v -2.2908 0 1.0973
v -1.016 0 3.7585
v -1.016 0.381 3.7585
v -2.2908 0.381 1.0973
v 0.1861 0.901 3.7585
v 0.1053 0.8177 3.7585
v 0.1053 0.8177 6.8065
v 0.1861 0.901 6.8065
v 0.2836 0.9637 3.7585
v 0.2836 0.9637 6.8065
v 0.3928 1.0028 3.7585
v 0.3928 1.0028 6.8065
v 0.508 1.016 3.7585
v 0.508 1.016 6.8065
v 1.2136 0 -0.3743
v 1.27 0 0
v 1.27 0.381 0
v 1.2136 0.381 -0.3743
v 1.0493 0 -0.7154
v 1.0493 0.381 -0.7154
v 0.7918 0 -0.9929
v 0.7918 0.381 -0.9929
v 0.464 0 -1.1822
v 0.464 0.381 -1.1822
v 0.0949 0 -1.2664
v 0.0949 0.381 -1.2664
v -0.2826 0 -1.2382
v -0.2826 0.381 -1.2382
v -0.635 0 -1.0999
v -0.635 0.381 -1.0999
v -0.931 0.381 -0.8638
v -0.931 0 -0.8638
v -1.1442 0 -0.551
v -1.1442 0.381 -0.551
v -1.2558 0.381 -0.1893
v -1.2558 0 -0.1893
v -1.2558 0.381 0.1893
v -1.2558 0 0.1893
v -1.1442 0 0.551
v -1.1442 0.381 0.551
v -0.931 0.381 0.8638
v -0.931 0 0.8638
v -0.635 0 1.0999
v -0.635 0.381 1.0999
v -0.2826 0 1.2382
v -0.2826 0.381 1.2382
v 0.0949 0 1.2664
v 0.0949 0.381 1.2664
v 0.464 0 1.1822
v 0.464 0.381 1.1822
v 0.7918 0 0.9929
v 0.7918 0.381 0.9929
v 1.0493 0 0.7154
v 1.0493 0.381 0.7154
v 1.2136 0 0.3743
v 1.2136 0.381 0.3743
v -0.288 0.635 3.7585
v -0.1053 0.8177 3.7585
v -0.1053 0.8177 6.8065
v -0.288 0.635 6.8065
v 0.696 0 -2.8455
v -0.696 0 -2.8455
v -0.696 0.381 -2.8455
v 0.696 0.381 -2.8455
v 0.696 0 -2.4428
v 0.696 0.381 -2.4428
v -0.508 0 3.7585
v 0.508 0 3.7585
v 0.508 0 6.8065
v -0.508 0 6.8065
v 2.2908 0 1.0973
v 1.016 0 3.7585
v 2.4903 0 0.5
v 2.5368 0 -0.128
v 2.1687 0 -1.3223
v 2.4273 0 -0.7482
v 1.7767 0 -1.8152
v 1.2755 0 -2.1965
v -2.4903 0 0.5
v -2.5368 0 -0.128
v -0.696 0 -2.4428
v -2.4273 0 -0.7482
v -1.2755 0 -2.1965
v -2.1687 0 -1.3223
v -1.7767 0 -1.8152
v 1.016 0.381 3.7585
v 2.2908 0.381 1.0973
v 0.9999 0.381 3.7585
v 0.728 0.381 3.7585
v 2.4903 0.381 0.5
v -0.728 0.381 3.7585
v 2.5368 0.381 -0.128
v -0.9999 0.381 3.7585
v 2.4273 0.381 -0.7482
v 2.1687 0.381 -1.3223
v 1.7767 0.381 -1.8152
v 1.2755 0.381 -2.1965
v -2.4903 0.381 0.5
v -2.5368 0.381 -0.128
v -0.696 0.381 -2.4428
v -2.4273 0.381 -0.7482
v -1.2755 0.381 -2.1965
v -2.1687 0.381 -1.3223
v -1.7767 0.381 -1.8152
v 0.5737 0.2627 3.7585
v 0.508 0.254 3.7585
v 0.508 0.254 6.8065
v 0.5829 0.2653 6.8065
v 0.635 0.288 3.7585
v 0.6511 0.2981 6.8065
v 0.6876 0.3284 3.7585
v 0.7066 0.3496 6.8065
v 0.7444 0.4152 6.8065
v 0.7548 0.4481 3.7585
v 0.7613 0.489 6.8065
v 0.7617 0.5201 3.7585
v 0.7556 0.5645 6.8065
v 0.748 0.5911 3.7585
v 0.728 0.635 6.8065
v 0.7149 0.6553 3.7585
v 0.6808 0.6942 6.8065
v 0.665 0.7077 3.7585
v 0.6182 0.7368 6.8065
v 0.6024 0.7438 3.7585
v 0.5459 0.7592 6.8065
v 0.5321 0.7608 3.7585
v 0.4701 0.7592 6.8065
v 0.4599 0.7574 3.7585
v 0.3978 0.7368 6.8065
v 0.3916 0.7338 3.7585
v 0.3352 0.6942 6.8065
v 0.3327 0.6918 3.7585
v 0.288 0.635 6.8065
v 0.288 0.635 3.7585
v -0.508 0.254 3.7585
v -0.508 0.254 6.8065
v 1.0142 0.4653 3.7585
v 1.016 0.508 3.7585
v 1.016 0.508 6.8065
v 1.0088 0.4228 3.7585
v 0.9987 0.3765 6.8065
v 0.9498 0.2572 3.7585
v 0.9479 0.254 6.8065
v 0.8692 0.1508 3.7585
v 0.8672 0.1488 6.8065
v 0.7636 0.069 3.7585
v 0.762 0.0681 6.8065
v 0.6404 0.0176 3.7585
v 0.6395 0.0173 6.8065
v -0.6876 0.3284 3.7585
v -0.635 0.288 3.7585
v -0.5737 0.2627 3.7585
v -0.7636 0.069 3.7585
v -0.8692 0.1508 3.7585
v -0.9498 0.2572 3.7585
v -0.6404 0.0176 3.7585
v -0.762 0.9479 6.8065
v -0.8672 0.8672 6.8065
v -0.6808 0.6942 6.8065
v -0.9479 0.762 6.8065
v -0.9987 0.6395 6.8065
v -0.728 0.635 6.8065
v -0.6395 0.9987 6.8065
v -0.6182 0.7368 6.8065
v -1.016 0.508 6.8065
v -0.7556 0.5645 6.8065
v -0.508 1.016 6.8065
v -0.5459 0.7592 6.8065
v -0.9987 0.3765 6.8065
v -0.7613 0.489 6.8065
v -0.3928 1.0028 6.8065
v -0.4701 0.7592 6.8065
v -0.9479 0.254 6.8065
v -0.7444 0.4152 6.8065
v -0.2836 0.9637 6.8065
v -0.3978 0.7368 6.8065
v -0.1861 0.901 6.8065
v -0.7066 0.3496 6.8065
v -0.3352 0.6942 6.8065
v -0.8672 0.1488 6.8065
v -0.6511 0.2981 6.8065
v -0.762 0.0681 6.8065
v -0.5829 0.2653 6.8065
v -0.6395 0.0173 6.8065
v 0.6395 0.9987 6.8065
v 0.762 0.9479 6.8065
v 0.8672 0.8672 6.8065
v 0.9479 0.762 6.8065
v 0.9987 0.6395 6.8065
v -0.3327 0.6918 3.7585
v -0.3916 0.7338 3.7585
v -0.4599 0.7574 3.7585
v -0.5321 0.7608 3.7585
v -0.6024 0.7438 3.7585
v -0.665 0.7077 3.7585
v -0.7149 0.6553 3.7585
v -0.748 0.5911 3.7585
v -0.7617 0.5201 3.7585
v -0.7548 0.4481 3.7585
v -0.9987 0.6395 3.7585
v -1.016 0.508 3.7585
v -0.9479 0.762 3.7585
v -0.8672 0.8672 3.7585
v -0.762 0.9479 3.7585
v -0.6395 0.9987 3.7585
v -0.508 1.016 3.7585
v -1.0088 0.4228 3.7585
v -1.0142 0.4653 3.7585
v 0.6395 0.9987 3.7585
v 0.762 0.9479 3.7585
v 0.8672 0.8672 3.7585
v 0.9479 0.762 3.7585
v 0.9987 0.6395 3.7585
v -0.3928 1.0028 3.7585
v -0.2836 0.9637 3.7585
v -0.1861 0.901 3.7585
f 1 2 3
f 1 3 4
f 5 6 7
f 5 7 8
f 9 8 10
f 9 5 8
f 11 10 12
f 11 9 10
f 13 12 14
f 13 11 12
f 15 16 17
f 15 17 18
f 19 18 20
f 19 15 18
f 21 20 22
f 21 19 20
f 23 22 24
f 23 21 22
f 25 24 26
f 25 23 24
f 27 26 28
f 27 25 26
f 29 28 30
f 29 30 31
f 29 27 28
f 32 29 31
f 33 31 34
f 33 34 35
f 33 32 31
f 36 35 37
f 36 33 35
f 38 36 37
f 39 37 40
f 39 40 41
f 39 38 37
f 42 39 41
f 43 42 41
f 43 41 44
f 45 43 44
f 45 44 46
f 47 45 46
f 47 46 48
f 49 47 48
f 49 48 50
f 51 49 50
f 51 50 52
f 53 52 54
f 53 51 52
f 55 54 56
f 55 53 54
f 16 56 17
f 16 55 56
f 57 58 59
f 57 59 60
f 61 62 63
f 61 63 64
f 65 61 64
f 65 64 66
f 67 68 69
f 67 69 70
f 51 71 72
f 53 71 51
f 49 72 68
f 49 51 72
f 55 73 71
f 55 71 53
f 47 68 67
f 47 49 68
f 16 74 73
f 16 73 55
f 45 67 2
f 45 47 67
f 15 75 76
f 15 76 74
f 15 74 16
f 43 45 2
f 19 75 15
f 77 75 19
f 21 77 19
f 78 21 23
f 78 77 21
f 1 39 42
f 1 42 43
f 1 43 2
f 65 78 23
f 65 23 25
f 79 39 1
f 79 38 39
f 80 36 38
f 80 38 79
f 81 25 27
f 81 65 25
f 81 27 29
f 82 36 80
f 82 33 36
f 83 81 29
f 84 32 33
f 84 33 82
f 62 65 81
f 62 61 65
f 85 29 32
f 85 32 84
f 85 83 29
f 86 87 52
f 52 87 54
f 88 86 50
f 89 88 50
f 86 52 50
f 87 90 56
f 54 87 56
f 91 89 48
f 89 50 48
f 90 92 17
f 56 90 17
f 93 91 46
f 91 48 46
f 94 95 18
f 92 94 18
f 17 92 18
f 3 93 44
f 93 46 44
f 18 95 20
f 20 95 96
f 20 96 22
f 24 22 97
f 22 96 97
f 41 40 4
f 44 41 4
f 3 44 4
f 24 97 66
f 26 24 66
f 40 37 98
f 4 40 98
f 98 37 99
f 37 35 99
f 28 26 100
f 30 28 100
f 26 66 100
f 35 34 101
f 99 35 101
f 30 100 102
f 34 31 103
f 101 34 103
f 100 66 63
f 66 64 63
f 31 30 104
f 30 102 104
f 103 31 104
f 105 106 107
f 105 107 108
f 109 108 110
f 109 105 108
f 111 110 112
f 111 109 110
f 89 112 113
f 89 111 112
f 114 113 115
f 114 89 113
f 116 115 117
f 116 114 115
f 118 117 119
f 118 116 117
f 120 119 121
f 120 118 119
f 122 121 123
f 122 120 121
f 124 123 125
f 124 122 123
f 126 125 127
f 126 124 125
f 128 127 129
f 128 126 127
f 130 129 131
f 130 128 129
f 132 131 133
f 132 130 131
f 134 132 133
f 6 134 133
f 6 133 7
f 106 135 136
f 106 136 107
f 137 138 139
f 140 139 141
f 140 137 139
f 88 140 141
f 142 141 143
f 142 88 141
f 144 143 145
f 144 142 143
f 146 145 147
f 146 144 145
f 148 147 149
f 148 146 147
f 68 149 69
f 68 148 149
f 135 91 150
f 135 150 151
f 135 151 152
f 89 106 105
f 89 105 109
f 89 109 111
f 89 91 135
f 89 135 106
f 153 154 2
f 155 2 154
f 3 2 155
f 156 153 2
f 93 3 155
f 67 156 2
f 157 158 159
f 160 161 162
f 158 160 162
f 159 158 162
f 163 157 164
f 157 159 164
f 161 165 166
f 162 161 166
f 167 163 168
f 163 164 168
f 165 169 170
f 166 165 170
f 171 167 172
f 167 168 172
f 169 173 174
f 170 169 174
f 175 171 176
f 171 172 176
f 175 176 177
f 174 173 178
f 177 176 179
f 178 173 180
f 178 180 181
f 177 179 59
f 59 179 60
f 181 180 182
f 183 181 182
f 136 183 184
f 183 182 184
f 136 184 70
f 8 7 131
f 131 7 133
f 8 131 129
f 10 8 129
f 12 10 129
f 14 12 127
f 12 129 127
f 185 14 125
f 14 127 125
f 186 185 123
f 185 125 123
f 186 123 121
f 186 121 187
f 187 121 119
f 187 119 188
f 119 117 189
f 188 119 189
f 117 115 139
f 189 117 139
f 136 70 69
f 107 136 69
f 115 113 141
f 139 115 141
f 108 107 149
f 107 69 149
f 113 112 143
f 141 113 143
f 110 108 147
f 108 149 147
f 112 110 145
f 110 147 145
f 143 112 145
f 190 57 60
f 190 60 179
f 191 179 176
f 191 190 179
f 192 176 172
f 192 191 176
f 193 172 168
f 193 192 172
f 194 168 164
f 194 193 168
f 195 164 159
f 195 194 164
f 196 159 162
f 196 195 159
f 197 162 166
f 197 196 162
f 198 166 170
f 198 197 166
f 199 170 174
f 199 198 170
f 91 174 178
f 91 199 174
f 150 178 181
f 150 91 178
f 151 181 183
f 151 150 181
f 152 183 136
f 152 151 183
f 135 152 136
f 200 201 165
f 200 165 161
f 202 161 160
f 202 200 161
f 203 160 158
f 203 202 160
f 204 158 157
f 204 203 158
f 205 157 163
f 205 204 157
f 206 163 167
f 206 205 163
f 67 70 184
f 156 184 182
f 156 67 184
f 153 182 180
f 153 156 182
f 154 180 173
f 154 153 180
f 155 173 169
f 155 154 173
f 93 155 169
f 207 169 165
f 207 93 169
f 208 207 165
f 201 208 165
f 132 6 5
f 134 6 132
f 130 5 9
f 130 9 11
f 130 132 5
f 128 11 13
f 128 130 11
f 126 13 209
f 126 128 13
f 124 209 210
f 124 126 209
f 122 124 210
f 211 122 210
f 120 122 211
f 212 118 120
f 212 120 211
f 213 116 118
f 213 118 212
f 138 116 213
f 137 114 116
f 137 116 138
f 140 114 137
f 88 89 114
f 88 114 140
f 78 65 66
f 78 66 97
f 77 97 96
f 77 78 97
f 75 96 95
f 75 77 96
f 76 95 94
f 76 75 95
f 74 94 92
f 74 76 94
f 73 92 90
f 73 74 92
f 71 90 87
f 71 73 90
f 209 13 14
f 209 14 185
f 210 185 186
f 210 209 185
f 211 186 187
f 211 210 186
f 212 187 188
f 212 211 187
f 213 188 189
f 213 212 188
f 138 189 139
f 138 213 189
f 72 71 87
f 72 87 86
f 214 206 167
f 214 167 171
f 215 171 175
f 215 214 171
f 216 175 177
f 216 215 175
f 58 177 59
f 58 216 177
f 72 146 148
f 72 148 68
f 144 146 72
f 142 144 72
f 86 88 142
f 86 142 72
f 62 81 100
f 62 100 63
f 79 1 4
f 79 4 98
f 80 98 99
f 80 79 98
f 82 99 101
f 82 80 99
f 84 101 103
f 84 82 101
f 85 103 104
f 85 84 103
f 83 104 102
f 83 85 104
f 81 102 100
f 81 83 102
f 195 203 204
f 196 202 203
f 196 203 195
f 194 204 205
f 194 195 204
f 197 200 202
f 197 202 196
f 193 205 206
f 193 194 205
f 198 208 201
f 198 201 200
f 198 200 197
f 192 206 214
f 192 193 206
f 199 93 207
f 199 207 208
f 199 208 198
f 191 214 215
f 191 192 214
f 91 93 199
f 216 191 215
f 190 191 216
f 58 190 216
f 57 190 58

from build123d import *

# Parameters (mm, degrees)
SKETCH1_R           = 1.27
BOSS_EXTRUDE1_DEPTH = 0.381
SKETCH2_W           = 2.032
SKETCH2_H           = 3.048
BOSS_EXTRUDE2_DEPTH = 0.635
CUT_EXTRUDE1_START  = -3.048
CUT_EXTRUDE1_DEPTH  = 3.048


with BuildPart() as part:
    # Sketch1 → Boss-Extrude1 (new body)
    with BuildSketch(Plane(origin=(0, 0, 0), x_dir=(1, 0, 0), z_dir=(0, 1, 0))):
        with BuildLine():
            Line((-0.695956456, 2.442794427), (-0.695956456, 2.845479033))
            Line((-0.695956456, 2.845479033), (0.695956456, 2.845479033))
            Line((0.695956456, 2.845479033), (0.695956456, 2.442794427))
            ThreePointArc((0.695956456, 2.442794427), (2.315850071, 1.043282535), (2.290753246, -1.097291924))
            Line((2.290753246, -1.097291924), (1.016, -3.758520967))
            Line((1.016, -3.758520967), (1.016, -6.806520967))
            Line((1.016, -6.806520967), (-1.016, -6.806520967))
            Line((-1.016, -6.806520967), (-1.016, -3.758520967))
            Line((-1.016, -3.758520967), (-2.290753246, -1.097291924))
            ThreePointArc((-2.290753246, -1.097291924), (-2.315850071, 1.043282535), (-0.695956456, 2.442794427))
        make_face()
        Circle(SKETCH1_R, mode=Mode.SUBTRACT)
    extrude(amount=BOSS_EXTRUDE1_DEPTH)

    # Sketch2 → Boss-Extrude2 (add)
    with BuildSketch(Plane(origin=(0, 0.381, 0), x_dir=(1, 0, 0), z_dir=(0, 1, 0))):
        with Locations((0, -5.282520967)):
            Rectangle(SKETCH2_W, SKETCH2_H)
    extrude(amount=BOSS_EXTRUDE2_DEPTH)

    # Sketch3 → Cut-Extrude1 (cut)
    with BuildSketch(Plane.XY.offset(6.806520967).offset(CUT_EXTRUDE1_START)):
        with BuildLine():
            ThreePointArc((1.016, 0.508), (0.867210245, 0.148789755), (0.508, 0))
            Line((0.508, 0), (1.016, 0))
            Line((1.016, 0), (1.016, 0.508))
        make_face()
        with BuildLine():
            ThreePointArc((-0.508, 0), (-0.867210245, 0.148789755), (-1.016, 0.508))
            Line((-1.016, 0.508), (-1.016, 0))
            Line((-1.016, 0), (-0.508, 0))
        make_face()
        with BuildLine():
            ThreePointArc((-1.016, 0.508), (-0.867210245, 0.867210245), (-0.508, 1.016))
            Line((-0.508, 1.016), (-1.016, 1.016))
            Line((-1.016, 1.016), (-1.016, 0.508))
        make_face()
        with BuildLine():
            ThreePointArc((0.105325044, 0.817704504), (0.283573941, 0.963737802), (0.508, 1.016))
            Line((0.508, 1.016), (-0.508, 1.016))
            ThreePointArc((-0.508, 1.016), (-0.283573941, 0.963737802), (-0.105325044, 0.817704504))
            Line((-0.105325044, 0.817704504), (-0.288029547, 0.635))
            ThreePointArc((-0.288029547, 0.635), (-0.727970453, 0.635), (-0.508, 0.254))
            Line((-0.508, 0.254), (0.508, 0.254))
            ThreePointArc((0.508, 0.254), (0.727970453, 0.635), (0.288029547, 0.635))
            Line((0.288029547, 0.635), (0.105325044, 0.817704504))
        make_face()
        with BuildLine():
            ThreePointArc((0.508, 1.016), (0.867210245, 0.867210245), (1.016, 0.508))
            Line((1.016, 0.508), (1.016, 1.016))
            Line((1.016, 1.016), (0.508, 1.016))
        make_face()
    extrude(amount=CUT_EXTRUDE1_DEPTH, mode=Mode.SUBTRACT)


solid = part.part
